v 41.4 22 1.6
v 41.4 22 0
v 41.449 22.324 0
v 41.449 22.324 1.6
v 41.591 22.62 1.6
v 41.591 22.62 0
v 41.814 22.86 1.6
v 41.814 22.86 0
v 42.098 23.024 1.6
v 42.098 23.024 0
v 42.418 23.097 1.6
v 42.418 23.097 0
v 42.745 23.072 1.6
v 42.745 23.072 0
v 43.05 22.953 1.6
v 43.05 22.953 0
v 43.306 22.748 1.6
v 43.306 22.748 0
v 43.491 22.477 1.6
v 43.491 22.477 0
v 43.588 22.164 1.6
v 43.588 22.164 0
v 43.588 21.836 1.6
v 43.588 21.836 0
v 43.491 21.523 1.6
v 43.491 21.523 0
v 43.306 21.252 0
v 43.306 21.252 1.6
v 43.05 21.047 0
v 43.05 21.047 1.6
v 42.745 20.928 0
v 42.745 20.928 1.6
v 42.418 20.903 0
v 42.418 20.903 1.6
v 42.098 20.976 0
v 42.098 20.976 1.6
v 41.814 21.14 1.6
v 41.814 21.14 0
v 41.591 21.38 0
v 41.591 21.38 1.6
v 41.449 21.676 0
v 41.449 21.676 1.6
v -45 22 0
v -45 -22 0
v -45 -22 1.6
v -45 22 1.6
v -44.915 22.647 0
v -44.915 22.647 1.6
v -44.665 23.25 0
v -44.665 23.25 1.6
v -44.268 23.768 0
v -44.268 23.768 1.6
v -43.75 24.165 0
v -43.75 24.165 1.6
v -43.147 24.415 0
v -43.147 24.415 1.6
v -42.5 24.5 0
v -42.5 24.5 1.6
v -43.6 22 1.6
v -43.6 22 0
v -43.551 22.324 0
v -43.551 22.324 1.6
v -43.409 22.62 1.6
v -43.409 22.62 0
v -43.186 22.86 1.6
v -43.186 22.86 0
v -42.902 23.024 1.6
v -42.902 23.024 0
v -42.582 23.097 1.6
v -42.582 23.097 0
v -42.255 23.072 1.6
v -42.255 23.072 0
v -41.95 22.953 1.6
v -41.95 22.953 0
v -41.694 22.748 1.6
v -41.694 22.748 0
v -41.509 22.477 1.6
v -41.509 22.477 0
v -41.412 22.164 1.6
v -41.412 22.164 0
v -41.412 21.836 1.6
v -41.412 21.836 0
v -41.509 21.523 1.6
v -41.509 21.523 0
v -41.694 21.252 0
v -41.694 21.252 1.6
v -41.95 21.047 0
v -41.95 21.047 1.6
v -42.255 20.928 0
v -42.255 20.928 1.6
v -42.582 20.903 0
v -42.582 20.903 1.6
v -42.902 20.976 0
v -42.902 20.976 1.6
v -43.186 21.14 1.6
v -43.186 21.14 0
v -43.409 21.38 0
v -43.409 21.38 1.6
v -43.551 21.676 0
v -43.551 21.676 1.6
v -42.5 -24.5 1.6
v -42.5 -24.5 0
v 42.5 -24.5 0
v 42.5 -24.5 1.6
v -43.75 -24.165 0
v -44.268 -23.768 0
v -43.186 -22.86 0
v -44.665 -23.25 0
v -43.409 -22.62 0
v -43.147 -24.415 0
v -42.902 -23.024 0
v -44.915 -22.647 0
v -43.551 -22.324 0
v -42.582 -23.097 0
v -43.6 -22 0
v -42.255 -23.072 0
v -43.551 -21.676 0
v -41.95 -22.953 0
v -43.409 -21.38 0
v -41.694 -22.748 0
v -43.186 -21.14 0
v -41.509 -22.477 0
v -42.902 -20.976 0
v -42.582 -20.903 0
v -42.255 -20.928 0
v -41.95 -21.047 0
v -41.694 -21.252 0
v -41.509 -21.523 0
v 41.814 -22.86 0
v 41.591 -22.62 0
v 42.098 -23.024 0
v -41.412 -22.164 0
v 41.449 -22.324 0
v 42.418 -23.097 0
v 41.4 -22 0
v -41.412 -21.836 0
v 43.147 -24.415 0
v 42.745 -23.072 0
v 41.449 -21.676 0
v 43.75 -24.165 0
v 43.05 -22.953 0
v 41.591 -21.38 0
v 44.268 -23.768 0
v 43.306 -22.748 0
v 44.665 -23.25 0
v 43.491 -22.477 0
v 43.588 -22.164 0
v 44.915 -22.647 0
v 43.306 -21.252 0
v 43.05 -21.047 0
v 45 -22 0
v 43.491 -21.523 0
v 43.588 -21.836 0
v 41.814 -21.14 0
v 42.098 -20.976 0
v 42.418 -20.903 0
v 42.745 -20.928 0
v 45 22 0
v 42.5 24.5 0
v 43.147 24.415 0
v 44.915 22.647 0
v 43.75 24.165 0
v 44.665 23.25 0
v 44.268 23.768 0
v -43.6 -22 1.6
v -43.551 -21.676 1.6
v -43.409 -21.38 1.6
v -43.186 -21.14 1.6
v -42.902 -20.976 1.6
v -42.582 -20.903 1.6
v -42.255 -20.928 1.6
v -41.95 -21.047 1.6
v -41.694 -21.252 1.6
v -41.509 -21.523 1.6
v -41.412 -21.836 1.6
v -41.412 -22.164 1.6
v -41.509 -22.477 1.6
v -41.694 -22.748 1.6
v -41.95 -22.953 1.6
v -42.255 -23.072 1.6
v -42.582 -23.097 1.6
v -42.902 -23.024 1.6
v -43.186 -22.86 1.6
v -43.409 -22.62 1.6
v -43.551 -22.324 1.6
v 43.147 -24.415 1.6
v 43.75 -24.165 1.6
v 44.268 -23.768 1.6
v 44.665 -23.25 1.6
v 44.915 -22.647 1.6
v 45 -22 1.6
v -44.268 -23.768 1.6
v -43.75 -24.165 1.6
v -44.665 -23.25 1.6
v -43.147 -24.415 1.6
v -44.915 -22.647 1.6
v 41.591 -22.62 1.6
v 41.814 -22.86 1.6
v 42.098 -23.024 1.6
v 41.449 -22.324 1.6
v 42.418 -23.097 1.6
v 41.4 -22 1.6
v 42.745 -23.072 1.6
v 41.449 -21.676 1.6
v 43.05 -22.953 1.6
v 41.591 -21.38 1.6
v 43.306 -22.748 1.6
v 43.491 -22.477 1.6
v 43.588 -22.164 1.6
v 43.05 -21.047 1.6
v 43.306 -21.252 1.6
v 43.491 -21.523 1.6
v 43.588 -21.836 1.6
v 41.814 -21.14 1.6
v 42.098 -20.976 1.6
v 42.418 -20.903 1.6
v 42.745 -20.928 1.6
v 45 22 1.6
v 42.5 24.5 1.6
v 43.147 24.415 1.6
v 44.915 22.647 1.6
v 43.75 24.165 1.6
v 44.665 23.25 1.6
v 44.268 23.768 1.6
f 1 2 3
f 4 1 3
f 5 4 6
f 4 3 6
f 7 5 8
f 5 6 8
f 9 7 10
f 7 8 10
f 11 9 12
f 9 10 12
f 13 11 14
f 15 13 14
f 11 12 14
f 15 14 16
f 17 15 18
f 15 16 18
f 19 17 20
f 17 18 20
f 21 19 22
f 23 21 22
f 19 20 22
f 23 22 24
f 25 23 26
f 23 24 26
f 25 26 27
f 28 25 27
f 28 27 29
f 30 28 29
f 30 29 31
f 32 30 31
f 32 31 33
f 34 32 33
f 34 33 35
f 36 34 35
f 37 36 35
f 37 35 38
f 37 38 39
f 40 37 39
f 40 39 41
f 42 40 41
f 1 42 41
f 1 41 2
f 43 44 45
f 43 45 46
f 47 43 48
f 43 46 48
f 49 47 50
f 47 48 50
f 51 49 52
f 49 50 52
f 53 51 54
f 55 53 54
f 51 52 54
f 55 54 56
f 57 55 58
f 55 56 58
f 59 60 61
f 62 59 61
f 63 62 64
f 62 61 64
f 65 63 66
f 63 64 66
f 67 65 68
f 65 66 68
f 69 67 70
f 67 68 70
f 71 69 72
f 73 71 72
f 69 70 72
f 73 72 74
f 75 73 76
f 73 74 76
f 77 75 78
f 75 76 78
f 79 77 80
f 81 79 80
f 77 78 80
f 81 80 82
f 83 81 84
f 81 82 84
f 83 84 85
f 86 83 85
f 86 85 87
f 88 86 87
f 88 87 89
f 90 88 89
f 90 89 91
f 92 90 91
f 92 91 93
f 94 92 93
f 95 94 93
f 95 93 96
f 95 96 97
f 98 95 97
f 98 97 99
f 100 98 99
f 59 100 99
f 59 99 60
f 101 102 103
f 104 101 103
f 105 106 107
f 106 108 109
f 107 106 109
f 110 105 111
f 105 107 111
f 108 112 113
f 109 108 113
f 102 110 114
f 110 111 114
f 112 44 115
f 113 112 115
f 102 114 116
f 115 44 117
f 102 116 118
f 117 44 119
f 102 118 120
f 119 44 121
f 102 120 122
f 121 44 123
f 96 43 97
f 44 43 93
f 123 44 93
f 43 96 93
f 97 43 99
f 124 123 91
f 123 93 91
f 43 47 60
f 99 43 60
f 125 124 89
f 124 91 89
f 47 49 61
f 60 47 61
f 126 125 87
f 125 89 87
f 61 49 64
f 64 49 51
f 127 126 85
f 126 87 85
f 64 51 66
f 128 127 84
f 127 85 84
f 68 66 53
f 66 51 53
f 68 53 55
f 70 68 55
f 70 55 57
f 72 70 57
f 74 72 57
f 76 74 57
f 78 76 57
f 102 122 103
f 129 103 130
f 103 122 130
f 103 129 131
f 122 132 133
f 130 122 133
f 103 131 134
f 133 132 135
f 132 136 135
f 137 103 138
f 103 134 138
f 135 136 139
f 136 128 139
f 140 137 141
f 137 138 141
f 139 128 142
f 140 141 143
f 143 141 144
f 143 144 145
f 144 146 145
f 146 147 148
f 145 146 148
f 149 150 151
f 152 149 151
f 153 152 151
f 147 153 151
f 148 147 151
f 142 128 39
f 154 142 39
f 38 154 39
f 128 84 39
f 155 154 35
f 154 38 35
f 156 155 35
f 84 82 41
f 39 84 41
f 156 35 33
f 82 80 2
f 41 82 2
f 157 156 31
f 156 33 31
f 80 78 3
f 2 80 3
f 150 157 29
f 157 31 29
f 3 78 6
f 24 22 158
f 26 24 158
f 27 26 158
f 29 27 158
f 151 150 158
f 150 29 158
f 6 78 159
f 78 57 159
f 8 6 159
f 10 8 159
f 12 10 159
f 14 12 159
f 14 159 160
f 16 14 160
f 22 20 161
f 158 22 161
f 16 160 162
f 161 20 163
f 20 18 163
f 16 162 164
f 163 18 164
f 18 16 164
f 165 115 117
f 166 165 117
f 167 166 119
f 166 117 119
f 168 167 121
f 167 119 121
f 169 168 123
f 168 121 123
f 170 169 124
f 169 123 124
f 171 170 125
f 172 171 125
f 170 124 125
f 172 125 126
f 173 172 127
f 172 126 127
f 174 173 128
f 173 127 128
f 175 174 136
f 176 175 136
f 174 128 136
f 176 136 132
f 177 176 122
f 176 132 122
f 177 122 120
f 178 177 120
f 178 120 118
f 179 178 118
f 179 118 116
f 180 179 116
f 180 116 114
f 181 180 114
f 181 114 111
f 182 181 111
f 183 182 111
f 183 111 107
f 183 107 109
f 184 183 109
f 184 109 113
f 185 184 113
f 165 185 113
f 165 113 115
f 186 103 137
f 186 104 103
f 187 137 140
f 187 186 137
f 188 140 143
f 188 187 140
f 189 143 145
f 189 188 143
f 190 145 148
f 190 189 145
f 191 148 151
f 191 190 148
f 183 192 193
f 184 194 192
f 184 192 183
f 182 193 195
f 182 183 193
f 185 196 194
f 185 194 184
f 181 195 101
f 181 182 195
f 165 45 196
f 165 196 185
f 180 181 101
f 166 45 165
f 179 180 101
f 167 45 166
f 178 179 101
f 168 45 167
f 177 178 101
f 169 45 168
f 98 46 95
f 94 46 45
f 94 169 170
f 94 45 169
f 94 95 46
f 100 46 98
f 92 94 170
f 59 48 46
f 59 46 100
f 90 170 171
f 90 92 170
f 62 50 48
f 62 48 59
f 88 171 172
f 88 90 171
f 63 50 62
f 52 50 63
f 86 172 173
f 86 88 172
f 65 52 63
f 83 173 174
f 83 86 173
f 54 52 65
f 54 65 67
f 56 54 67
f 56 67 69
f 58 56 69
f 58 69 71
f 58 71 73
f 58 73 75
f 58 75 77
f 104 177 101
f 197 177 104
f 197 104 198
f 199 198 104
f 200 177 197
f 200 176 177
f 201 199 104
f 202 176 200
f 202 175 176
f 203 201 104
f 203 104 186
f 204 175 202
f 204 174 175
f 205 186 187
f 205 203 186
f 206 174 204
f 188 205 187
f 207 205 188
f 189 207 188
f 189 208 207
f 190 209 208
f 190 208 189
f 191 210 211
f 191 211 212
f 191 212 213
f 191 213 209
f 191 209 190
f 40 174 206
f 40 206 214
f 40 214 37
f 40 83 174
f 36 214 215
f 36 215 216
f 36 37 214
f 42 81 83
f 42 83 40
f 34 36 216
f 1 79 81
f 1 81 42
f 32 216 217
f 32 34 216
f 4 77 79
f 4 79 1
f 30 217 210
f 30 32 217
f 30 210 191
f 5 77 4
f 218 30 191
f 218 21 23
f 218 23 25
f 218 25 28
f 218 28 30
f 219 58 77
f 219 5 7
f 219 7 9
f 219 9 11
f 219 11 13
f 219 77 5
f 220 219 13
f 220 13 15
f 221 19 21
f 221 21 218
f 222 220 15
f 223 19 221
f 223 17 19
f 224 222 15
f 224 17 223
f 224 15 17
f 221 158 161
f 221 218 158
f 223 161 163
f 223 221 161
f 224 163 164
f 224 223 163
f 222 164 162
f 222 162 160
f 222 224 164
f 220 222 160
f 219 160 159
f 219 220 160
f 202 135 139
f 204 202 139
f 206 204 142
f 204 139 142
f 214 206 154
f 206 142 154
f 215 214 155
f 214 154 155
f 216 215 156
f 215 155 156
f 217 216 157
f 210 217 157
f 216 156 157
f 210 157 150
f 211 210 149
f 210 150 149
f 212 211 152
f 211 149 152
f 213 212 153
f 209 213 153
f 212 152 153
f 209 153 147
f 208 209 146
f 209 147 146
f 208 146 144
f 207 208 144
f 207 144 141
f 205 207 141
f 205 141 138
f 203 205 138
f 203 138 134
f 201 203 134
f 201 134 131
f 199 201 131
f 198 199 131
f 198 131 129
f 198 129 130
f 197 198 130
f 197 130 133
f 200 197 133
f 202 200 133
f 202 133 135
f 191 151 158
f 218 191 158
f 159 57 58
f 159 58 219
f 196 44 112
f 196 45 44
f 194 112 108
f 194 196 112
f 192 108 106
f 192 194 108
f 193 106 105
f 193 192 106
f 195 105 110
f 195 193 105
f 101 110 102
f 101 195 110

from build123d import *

# Parameters (mm, degrees)
SKETCH_1_W          = 90
SKETCH_1_H          = 49
EXTRUDE_1_DEPTH     = 1.6
FILLET_1_R          = 2.5
SKETCH_2_R          = 1.1
CUT_EXTRUDE_1_DEPTH = 26.6


with BuildPart() as part:
    # 草图1 → 凸台-拉伸1 (new body)
    with BuildSketch(Plane.XY):
        Rectangle(SKETCH_1_W, SKETCH_1_H)
    extrude(amount=EXTRUDE_1_DEPTH)

    # 圆角1
    fillet_1_edges = [part.edges().sort_by_distance(p)[0] for p in [
        (45, -24.5, 0.8),
        (-45, -24.5, 0.8),
        (-45, 24.5, 0.8),
        (45, 24.5, 0.8),
    ]]
    fillet(fillet_1_edges, radius=FILLET_1_R)

    # 草图2 → 切除-拉伸1 (cut)
    with BuildSketch(Plane(origin=(0, 0, 0), x_dir=(-1, 0, 0), z_dir=(0, 0, -1))):
        with Locations((-42.5, -22)):
            Circle(SKETCH_2_R)
        with Locations((-42.5, 22)):
            Circle(SKETCH_2_R)
        with Locations((42.5, 22)):
            Circle(SKETCH_2_R)
        with Locations((42.5, -22)):
            Circle(SKETCH_2_R)
    extrude(amount=-CUT_EXTRUDE_1_DEPTH, mode=Mode.SUBTRACT)


solid = part.part
